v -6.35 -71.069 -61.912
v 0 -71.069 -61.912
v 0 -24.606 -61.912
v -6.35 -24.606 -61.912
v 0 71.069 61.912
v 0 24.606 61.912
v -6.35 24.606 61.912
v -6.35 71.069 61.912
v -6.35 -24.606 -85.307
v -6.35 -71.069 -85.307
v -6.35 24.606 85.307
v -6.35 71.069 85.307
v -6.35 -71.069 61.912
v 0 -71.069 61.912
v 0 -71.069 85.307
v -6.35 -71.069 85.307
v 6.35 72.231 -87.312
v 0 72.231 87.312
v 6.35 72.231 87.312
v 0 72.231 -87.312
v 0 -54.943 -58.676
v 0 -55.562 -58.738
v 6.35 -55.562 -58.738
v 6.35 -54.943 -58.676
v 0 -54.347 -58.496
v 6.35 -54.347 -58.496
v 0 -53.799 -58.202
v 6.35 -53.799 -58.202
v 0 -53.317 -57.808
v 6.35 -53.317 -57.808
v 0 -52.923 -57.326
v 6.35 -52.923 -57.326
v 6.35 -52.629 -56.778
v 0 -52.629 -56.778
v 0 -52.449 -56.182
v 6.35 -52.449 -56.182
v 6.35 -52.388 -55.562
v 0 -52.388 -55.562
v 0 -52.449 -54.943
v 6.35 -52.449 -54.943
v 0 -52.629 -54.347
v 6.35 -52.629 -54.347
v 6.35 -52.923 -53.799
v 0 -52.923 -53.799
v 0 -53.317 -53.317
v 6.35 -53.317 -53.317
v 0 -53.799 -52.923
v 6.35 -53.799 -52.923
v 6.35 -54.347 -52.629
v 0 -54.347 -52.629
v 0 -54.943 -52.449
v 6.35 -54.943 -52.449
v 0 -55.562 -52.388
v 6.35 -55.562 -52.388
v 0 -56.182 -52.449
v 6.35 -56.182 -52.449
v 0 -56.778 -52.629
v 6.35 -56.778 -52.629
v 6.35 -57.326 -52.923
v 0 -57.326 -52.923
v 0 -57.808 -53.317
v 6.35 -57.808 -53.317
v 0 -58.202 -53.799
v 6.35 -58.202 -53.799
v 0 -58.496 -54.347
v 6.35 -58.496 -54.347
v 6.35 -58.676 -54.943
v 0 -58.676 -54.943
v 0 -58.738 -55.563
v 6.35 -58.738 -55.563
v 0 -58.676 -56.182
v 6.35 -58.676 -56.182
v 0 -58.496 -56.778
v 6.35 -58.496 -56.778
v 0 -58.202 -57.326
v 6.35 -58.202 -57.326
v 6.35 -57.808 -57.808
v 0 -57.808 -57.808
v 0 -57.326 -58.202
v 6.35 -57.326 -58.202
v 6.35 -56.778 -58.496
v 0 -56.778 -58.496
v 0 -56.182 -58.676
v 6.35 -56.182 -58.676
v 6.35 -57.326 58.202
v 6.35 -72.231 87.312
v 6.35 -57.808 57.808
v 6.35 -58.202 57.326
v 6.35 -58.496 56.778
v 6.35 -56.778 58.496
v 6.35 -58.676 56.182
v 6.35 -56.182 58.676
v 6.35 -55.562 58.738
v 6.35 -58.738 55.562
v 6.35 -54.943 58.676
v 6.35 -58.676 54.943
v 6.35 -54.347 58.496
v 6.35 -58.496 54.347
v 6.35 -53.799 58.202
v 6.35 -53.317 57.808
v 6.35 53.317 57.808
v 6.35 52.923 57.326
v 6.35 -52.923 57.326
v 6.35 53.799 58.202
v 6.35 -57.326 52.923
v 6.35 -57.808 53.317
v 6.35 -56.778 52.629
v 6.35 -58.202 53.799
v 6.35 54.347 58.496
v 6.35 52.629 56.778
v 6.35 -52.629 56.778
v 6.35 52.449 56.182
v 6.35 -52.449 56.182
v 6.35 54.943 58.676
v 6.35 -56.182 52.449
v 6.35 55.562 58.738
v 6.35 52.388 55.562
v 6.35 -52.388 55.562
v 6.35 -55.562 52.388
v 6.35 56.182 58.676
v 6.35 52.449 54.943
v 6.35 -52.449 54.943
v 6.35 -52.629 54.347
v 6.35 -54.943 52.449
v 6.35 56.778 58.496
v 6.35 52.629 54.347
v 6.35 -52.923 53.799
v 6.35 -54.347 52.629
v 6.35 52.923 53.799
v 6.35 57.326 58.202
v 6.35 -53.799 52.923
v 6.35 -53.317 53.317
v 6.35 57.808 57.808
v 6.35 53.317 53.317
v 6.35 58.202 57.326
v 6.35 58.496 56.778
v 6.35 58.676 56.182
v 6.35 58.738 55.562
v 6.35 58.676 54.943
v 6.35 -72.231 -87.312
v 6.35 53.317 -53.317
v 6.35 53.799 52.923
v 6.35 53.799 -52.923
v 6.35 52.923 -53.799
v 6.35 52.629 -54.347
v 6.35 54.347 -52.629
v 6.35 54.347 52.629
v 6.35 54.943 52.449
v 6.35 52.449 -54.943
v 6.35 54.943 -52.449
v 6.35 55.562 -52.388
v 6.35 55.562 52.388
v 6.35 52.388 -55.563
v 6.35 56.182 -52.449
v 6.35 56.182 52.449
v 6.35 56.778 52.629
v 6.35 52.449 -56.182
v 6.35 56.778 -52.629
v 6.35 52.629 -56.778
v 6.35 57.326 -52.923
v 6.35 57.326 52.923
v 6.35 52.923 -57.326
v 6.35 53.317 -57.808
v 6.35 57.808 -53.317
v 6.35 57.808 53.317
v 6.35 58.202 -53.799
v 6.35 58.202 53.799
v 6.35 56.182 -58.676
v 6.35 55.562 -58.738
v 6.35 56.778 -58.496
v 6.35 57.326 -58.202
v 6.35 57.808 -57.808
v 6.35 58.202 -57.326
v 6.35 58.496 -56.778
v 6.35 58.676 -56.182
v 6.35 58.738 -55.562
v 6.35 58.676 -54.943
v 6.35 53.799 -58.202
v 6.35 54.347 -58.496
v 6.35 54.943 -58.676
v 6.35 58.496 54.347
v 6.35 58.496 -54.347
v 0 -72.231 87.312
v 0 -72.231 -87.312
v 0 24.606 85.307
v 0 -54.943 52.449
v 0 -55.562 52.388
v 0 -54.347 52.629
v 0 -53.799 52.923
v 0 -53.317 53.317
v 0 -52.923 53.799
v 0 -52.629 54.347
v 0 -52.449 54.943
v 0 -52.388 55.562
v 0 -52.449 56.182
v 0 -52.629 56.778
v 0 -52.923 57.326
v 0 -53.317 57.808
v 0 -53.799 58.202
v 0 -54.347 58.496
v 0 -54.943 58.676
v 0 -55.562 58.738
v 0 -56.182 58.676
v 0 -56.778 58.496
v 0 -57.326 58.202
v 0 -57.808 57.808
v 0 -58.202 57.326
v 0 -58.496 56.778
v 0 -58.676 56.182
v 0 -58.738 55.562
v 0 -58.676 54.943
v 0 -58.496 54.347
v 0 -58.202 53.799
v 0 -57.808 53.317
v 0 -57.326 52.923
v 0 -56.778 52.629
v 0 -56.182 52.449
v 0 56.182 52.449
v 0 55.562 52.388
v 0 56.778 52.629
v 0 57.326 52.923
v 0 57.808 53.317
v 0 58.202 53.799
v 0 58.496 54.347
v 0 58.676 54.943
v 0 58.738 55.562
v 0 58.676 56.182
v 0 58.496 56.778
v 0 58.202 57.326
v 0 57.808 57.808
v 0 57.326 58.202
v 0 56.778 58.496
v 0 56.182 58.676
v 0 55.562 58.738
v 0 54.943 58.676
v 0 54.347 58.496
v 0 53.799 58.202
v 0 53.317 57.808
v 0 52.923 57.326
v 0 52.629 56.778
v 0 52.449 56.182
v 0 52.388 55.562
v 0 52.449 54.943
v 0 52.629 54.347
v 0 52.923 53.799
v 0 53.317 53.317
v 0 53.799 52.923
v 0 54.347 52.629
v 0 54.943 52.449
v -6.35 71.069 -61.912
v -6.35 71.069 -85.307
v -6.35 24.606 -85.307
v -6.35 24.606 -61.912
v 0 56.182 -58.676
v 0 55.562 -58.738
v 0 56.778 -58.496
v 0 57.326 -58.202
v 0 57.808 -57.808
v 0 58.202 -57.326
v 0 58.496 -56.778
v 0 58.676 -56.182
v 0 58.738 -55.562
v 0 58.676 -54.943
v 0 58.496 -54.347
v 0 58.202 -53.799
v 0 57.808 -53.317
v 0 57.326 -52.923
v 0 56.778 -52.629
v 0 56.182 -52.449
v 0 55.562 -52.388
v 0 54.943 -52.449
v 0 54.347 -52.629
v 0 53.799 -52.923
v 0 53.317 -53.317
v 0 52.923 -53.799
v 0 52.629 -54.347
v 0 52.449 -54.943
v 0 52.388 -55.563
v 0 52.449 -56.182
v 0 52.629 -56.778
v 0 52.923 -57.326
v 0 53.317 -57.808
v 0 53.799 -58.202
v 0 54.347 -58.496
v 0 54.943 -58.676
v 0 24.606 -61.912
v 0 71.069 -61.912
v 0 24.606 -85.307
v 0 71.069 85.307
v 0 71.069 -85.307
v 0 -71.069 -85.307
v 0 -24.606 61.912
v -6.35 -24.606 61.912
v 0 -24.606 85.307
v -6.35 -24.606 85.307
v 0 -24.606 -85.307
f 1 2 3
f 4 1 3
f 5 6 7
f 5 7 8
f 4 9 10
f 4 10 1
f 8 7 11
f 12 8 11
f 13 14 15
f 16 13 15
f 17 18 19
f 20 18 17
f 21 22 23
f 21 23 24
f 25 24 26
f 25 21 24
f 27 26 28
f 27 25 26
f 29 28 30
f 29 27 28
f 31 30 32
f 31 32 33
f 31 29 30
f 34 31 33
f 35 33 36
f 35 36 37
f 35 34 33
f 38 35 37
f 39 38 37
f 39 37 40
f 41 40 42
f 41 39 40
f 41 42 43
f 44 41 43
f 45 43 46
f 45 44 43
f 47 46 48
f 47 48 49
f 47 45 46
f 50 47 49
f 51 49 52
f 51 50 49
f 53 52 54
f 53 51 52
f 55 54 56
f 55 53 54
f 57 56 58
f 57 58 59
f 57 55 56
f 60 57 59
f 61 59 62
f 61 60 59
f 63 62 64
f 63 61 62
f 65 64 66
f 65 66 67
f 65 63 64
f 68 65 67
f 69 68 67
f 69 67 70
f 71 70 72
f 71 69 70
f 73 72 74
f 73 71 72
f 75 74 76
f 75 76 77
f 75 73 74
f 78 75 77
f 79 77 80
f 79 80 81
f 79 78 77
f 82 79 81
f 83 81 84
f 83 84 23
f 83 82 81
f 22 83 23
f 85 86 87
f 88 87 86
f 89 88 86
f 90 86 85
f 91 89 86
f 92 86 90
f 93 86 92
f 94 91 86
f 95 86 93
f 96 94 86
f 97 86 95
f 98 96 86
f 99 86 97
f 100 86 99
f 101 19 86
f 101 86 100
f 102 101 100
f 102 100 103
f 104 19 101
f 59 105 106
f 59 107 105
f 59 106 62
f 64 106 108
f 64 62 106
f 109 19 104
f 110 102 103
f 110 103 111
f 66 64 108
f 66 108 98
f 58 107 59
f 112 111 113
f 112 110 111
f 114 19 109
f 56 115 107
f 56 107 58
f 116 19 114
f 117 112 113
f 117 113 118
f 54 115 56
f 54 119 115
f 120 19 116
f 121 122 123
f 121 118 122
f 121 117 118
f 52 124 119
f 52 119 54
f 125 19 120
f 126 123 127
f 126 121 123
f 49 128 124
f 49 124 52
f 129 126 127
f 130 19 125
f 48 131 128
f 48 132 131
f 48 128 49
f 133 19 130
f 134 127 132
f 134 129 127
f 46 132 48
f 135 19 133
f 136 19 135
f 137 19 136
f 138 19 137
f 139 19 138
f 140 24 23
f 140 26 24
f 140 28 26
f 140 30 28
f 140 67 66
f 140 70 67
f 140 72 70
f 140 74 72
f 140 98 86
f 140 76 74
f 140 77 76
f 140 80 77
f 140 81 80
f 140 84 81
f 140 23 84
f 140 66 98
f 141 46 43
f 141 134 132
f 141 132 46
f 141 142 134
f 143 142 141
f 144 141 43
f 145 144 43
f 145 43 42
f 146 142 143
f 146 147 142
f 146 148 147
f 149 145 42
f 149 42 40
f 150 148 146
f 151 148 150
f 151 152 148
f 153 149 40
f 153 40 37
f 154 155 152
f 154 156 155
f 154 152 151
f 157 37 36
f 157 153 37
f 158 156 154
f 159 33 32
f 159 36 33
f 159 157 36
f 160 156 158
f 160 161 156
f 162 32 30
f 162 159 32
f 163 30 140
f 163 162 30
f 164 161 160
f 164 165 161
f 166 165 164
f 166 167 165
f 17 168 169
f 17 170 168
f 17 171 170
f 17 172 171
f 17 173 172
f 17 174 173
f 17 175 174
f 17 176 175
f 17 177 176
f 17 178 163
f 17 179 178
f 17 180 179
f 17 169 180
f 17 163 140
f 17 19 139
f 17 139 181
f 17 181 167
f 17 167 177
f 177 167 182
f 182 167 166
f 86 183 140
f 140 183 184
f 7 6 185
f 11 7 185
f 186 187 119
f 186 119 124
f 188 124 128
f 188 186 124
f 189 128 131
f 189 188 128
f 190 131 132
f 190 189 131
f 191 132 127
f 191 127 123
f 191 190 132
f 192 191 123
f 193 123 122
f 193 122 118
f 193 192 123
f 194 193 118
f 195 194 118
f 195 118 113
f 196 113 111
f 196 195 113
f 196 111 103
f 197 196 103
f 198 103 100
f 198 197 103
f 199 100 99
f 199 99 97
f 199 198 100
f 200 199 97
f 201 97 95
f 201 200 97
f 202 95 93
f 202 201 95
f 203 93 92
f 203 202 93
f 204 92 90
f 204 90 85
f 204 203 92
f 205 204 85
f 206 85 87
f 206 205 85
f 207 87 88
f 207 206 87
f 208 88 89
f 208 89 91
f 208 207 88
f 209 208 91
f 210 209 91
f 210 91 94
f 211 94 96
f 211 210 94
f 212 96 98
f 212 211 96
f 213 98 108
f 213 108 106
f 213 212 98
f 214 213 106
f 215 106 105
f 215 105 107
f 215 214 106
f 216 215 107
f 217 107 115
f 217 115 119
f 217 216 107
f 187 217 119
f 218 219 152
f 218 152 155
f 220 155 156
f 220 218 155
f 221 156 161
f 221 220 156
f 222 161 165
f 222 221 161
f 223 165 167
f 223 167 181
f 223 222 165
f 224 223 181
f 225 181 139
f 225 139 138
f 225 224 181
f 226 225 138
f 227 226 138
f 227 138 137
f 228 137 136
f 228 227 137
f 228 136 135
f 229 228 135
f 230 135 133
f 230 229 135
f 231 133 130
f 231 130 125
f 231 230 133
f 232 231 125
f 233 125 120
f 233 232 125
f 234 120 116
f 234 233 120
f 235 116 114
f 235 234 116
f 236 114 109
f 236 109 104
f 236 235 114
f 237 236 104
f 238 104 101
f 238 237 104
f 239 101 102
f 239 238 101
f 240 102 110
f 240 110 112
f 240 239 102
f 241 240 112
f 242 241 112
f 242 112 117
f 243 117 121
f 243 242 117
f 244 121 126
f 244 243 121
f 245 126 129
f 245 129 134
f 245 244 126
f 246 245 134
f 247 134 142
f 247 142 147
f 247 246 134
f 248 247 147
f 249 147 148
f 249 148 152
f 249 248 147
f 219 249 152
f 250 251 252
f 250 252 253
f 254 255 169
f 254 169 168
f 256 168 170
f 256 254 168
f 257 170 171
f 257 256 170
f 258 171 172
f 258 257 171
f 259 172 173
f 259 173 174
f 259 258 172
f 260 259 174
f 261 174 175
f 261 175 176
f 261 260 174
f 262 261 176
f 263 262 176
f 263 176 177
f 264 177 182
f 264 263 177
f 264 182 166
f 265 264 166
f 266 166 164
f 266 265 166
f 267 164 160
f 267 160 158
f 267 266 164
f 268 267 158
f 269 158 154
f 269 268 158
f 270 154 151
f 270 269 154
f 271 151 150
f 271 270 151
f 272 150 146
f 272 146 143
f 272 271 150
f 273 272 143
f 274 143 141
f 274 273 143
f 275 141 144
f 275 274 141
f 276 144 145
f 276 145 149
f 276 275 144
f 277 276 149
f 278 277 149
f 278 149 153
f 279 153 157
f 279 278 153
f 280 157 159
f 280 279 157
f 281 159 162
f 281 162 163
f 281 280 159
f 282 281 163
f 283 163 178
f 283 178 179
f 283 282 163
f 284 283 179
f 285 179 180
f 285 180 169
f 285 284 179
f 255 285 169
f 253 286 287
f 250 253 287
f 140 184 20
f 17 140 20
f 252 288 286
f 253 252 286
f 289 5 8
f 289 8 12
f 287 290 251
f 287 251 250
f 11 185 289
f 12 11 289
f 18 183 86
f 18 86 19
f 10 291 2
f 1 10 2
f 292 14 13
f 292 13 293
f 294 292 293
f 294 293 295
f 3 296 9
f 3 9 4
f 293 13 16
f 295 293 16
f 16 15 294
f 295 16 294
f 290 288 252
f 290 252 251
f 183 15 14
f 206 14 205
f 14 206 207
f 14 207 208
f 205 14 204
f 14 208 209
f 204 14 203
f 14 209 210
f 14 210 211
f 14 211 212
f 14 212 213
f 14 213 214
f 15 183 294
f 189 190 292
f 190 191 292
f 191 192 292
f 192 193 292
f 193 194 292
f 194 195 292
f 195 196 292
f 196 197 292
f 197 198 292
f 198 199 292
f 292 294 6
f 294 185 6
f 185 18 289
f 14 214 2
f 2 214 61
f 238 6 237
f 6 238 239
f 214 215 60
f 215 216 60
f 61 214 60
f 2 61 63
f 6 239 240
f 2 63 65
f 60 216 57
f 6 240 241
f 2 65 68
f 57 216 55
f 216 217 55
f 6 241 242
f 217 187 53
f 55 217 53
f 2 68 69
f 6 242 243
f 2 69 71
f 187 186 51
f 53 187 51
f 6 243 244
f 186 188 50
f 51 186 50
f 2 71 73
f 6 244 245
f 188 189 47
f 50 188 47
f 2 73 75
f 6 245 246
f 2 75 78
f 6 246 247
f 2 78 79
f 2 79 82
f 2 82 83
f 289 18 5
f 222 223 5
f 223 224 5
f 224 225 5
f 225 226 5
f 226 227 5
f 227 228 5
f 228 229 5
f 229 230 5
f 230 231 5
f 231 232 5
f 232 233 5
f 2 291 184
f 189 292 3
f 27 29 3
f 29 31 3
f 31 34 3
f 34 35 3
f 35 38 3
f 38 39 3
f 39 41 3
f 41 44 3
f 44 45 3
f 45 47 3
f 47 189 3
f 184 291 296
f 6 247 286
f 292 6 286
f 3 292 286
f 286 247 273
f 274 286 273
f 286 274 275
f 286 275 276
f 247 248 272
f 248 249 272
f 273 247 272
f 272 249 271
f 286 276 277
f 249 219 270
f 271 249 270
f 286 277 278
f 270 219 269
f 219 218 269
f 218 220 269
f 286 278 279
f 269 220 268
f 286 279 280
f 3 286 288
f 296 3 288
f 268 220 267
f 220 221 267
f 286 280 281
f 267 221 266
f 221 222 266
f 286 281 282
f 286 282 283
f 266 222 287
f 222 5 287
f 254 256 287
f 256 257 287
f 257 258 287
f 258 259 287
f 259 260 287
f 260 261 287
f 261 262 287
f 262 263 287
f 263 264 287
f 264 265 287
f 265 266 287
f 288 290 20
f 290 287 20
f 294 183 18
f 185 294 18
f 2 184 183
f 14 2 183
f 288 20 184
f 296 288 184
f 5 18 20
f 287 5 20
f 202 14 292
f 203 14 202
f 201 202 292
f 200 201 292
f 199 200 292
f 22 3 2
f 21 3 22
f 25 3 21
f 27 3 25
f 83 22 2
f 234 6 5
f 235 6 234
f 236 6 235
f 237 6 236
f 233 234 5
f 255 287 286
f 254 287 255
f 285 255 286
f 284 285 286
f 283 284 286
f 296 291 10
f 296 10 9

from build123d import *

# Parameters (mm, degrees)
SKETCH1_W           = 174.625
SKETCH1_H           = 144.4625
SKETCH1_R           = 3.175
BOSS_EXTRUDE1_DEPTH = 6.35
SKETCH2_W           = 23.394418878
SKETCH2_H           = 46.463143603
BOSS_EXTRUDE2_DEPTH = 6.35


with BuildPart() as part:
    # Sketch1 → Boss-Extrude1 (new body)
    with BuildSketch(Plane(origin=(0, 0, 0), x_dir=(0, 0, -1), z_dir=(1, 0, 0))):
        Rectangle(SKETCH1_W, SKETCH1_H)
        with Locations((-55.5625, 55.5625)):
            Circle(SKETCH1_R, mode=Mode.SUBTRACT)
        with Locations((55.5625, 55.5625)):
            Circle(SKETCH1_R, mode=Mode.SUBTRACT)
        with Locations((55.5625, -55.5625)):
            Circle(SKETCH1_R, mode=Mode.SUBTRACT)
        with Locations((-55.5625, -55.5625)):
            Circle(SKETCH1_R, mode=Mode.SUBTRACT)
    extrude(amount=BOSS_EXTRUDE1_DEPTH)

    # Sketch2 → Boss-Extrude2 (add)
    with BuildSketch(Plane.ZY):
        with Locations((73.609709439, 47.837821802)):
            Rectangle(SKETCH2_W, SKETCH2_H)
        with Locations((-73.609709439, 47.837821802)):
            Rectangle(SKETCH2_W, SKETCH2_H)
        with Locations((-73.609709439, -47.837821802)):
            Rectangle(SKETCH2_W, SKETCH2_H)
        with Locations((73.609709439, -47.837821802)):
            Rectangle(SKETCH2_W, SKETCH2_H)
    extrude(amount=BOSS_EXTRUDE2_DEPTH)


solid = part.part
